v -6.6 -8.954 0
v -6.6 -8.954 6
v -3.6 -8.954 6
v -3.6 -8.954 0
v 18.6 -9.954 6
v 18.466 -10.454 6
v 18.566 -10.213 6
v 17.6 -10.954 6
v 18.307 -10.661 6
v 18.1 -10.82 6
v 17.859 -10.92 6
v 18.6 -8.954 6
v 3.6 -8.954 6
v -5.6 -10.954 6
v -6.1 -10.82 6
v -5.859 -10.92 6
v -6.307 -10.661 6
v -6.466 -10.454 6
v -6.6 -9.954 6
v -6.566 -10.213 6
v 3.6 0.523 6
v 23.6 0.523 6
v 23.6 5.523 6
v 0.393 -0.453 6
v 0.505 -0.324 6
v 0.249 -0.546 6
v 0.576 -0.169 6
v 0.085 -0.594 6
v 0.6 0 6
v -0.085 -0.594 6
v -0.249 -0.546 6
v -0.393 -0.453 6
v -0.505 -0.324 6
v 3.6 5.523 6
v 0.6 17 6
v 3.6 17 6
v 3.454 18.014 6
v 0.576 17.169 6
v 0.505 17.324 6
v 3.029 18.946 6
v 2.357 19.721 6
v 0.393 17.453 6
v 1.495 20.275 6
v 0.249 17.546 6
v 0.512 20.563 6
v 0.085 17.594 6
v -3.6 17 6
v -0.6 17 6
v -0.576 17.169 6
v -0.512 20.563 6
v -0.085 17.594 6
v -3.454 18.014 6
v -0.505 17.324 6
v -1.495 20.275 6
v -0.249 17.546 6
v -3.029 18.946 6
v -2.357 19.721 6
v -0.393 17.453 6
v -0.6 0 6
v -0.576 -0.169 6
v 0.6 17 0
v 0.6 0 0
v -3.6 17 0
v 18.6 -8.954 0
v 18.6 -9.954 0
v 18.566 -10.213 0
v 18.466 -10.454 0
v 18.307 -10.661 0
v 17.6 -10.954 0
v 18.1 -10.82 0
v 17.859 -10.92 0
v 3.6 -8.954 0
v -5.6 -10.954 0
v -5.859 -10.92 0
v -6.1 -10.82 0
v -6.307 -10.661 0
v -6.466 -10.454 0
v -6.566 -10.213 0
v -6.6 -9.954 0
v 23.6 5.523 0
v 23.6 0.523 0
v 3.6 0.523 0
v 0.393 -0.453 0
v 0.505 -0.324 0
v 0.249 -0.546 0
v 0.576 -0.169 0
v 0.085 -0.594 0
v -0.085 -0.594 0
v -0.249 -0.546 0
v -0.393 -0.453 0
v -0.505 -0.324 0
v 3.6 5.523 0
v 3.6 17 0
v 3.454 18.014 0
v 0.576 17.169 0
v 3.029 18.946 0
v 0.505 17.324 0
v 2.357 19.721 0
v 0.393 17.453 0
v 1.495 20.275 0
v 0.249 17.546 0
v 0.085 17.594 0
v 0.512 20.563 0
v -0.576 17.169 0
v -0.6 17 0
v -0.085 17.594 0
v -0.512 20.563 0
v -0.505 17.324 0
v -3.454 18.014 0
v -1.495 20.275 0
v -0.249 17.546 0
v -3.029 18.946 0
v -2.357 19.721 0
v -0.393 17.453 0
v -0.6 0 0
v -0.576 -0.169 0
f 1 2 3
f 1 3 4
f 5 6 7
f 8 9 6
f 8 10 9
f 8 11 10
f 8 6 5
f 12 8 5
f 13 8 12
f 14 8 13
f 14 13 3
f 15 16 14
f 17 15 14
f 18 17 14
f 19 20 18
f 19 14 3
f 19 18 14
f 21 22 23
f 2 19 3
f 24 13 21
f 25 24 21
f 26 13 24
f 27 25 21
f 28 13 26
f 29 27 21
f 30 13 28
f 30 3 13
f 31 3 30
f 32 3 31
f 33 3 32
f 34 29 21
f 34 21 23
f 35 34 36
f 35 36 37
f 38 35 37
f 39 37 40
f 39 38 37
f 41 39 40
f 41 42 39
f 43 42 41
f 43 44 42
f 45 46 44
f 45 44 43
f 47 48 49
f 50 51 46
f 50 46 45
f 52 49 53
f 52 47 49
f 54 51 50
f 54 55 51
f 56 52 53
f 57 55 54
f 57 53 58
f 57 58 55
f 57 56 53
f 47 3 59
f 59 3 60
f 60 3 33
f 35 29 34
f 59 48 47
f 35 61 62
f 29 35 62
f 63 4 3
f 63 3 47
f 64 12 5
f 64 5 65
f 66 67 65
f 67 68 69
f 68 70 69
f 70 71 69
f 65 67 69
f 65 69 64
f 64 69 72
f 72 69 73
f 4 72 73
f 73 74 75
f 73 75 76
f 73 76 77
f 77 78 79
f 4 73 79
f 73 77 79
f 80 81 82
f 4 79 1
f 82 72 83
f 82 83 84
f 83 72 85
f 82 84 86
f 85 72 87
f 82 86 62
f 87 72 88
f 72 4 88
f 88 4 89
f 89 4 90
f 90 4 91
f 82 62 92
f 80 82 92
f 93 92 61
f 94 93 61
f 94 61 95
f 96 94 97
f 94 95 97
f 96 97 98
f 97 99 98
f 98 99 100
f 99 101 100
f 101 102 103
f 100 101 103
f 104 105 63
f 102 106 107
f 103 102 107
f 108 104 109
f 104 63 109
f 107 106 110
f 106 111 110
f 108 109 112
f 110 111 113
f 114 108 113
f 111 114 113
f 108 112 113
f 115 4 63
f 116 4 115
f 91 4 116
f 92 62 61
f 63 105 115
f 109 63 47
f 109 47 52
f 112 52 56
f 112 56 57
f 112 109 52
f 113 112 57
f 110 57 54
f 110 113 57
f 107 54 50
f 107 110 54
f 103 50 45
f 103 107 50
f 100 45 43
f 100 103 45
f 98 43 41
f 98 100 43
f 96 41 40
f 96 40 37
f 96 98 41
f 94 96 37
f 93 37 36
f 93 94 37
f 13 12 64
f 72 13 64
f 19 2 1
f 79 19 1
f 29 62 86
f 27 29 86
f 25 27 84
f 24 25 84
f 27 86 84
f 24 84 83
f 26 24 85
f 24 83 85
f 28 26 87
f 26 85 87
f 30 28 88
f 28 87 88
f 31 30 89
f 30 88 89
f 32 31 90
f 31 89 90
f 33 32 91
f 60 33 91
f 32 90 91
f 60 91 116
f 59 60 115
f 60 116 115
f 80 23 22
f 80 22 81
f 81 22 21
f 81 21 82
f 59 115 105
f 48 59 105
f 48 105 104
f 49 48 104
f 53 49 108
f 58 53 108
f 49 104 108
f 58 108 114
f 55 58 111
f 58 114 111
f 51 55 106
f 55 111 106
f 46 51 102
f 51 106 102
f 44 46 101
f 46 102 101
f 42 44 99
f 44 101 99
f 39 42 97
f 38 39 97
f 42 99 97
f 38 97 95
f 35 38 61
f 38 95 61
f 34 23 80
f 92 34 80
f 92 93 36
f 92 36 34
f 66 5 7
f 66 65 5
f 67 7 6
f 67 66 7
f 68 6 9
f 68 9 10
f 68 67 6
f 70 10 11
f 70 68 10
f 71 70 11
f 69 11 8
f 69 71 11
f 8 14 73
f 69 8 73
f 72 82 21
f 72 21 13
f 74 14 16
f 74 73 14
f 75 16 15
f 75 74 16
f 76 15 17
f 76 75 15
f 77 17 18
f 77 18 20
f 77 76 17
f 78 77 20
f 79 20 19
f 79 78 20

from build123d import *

# Parameters (mm, degrees)
BOSS_EXTRUDE1_DEPTH  = 6
SKETCH2_W            = 6
SKETCH2_H            = 5
BOSS_EXTRUDE2_DEPTH  = 20
EXTRUDE_1_DEPTH      = 15
EXTRUDE_1_DEPTH_BACK = 10.2
SKETCH_2_W           = 6
SKETCH_2_H           = 2
FILLET_3_R           = 1


with BuildPart() as part:
    # Sketch1 → Boss-Extrude1 (new body)
    with BuildSketch(Plane.XY):
        with BuildLine():
            Line((-3.6, 0), (-3.6, 17))
            ThreePointArc((-3.6, 17), (0, 20.6), (3.6, 17))
            Line((3.6, 17), (3.6, 0))
            Line((3.6, 0), (3.6, -10.95432829))
            Line((3.6, -10.95432829), (-3.6, -10.95432829))
            Line((-3.6, -10.95432829), (-3.6, 0))
        make_face()
        with BuildLine():
            Line((-0.6, 0), (-0.6, 17))
            ThreePointArc((-0.6, 17), (0, 17.6), (0.6, 17))
            Line((0.6, 17), (0.6, 0))
            ThreePointArc((0.6, 0), (0, -0.6), (-0.6, 0))
        make_face(mode=Mode.SUBTRACT)
    extrude(amount=BOSS_EXTRUDE1_DEPTH)

    # Sketch2 → Boss-Extrude2 (add)
    with BuildSketch(Plane(origin=(3.6, 0, 0), x_dir=(0, 0, -1), z_dir=(1, 0, 0))):
        with Locations((-3, 3.022835855)):
            Rectangle(SKETCH2_W, SKETCH2_H)
    extrude(amount=BOSS_EXTRUDE2_DEPTH)

    # Эскиз2 → Бобышка-Вытянуть1 (add, two sides: drawn at the far end of the back side and taken through both)
    with BuildSketch(Plane(origin=(3.6, 0, 0), x_dir=(0, 0, -1), z_dir=(1, 0, 0)).offset(-EXTRUDE_1_DEPTH_BACK)):
        with Locations((-3, -9.95432829)):
            Rectangle(SKETCH_2_W, SKETCH_2_H)
    extrude(amount=EXTRUDE_1_DEPTH + EXTRUDE_1_DEPTH_BACK)

    # Скругление3
    fillet_3_edges = [part.edges().sort_by_distance(p)[0] for p in [
        (-6.6, -10.95432829, 3),
        (18.6, -10.95432829, 3),
    ]]
    fillet(fillet_3_edges, radius=FILLET_3_R)


solid = part.part
